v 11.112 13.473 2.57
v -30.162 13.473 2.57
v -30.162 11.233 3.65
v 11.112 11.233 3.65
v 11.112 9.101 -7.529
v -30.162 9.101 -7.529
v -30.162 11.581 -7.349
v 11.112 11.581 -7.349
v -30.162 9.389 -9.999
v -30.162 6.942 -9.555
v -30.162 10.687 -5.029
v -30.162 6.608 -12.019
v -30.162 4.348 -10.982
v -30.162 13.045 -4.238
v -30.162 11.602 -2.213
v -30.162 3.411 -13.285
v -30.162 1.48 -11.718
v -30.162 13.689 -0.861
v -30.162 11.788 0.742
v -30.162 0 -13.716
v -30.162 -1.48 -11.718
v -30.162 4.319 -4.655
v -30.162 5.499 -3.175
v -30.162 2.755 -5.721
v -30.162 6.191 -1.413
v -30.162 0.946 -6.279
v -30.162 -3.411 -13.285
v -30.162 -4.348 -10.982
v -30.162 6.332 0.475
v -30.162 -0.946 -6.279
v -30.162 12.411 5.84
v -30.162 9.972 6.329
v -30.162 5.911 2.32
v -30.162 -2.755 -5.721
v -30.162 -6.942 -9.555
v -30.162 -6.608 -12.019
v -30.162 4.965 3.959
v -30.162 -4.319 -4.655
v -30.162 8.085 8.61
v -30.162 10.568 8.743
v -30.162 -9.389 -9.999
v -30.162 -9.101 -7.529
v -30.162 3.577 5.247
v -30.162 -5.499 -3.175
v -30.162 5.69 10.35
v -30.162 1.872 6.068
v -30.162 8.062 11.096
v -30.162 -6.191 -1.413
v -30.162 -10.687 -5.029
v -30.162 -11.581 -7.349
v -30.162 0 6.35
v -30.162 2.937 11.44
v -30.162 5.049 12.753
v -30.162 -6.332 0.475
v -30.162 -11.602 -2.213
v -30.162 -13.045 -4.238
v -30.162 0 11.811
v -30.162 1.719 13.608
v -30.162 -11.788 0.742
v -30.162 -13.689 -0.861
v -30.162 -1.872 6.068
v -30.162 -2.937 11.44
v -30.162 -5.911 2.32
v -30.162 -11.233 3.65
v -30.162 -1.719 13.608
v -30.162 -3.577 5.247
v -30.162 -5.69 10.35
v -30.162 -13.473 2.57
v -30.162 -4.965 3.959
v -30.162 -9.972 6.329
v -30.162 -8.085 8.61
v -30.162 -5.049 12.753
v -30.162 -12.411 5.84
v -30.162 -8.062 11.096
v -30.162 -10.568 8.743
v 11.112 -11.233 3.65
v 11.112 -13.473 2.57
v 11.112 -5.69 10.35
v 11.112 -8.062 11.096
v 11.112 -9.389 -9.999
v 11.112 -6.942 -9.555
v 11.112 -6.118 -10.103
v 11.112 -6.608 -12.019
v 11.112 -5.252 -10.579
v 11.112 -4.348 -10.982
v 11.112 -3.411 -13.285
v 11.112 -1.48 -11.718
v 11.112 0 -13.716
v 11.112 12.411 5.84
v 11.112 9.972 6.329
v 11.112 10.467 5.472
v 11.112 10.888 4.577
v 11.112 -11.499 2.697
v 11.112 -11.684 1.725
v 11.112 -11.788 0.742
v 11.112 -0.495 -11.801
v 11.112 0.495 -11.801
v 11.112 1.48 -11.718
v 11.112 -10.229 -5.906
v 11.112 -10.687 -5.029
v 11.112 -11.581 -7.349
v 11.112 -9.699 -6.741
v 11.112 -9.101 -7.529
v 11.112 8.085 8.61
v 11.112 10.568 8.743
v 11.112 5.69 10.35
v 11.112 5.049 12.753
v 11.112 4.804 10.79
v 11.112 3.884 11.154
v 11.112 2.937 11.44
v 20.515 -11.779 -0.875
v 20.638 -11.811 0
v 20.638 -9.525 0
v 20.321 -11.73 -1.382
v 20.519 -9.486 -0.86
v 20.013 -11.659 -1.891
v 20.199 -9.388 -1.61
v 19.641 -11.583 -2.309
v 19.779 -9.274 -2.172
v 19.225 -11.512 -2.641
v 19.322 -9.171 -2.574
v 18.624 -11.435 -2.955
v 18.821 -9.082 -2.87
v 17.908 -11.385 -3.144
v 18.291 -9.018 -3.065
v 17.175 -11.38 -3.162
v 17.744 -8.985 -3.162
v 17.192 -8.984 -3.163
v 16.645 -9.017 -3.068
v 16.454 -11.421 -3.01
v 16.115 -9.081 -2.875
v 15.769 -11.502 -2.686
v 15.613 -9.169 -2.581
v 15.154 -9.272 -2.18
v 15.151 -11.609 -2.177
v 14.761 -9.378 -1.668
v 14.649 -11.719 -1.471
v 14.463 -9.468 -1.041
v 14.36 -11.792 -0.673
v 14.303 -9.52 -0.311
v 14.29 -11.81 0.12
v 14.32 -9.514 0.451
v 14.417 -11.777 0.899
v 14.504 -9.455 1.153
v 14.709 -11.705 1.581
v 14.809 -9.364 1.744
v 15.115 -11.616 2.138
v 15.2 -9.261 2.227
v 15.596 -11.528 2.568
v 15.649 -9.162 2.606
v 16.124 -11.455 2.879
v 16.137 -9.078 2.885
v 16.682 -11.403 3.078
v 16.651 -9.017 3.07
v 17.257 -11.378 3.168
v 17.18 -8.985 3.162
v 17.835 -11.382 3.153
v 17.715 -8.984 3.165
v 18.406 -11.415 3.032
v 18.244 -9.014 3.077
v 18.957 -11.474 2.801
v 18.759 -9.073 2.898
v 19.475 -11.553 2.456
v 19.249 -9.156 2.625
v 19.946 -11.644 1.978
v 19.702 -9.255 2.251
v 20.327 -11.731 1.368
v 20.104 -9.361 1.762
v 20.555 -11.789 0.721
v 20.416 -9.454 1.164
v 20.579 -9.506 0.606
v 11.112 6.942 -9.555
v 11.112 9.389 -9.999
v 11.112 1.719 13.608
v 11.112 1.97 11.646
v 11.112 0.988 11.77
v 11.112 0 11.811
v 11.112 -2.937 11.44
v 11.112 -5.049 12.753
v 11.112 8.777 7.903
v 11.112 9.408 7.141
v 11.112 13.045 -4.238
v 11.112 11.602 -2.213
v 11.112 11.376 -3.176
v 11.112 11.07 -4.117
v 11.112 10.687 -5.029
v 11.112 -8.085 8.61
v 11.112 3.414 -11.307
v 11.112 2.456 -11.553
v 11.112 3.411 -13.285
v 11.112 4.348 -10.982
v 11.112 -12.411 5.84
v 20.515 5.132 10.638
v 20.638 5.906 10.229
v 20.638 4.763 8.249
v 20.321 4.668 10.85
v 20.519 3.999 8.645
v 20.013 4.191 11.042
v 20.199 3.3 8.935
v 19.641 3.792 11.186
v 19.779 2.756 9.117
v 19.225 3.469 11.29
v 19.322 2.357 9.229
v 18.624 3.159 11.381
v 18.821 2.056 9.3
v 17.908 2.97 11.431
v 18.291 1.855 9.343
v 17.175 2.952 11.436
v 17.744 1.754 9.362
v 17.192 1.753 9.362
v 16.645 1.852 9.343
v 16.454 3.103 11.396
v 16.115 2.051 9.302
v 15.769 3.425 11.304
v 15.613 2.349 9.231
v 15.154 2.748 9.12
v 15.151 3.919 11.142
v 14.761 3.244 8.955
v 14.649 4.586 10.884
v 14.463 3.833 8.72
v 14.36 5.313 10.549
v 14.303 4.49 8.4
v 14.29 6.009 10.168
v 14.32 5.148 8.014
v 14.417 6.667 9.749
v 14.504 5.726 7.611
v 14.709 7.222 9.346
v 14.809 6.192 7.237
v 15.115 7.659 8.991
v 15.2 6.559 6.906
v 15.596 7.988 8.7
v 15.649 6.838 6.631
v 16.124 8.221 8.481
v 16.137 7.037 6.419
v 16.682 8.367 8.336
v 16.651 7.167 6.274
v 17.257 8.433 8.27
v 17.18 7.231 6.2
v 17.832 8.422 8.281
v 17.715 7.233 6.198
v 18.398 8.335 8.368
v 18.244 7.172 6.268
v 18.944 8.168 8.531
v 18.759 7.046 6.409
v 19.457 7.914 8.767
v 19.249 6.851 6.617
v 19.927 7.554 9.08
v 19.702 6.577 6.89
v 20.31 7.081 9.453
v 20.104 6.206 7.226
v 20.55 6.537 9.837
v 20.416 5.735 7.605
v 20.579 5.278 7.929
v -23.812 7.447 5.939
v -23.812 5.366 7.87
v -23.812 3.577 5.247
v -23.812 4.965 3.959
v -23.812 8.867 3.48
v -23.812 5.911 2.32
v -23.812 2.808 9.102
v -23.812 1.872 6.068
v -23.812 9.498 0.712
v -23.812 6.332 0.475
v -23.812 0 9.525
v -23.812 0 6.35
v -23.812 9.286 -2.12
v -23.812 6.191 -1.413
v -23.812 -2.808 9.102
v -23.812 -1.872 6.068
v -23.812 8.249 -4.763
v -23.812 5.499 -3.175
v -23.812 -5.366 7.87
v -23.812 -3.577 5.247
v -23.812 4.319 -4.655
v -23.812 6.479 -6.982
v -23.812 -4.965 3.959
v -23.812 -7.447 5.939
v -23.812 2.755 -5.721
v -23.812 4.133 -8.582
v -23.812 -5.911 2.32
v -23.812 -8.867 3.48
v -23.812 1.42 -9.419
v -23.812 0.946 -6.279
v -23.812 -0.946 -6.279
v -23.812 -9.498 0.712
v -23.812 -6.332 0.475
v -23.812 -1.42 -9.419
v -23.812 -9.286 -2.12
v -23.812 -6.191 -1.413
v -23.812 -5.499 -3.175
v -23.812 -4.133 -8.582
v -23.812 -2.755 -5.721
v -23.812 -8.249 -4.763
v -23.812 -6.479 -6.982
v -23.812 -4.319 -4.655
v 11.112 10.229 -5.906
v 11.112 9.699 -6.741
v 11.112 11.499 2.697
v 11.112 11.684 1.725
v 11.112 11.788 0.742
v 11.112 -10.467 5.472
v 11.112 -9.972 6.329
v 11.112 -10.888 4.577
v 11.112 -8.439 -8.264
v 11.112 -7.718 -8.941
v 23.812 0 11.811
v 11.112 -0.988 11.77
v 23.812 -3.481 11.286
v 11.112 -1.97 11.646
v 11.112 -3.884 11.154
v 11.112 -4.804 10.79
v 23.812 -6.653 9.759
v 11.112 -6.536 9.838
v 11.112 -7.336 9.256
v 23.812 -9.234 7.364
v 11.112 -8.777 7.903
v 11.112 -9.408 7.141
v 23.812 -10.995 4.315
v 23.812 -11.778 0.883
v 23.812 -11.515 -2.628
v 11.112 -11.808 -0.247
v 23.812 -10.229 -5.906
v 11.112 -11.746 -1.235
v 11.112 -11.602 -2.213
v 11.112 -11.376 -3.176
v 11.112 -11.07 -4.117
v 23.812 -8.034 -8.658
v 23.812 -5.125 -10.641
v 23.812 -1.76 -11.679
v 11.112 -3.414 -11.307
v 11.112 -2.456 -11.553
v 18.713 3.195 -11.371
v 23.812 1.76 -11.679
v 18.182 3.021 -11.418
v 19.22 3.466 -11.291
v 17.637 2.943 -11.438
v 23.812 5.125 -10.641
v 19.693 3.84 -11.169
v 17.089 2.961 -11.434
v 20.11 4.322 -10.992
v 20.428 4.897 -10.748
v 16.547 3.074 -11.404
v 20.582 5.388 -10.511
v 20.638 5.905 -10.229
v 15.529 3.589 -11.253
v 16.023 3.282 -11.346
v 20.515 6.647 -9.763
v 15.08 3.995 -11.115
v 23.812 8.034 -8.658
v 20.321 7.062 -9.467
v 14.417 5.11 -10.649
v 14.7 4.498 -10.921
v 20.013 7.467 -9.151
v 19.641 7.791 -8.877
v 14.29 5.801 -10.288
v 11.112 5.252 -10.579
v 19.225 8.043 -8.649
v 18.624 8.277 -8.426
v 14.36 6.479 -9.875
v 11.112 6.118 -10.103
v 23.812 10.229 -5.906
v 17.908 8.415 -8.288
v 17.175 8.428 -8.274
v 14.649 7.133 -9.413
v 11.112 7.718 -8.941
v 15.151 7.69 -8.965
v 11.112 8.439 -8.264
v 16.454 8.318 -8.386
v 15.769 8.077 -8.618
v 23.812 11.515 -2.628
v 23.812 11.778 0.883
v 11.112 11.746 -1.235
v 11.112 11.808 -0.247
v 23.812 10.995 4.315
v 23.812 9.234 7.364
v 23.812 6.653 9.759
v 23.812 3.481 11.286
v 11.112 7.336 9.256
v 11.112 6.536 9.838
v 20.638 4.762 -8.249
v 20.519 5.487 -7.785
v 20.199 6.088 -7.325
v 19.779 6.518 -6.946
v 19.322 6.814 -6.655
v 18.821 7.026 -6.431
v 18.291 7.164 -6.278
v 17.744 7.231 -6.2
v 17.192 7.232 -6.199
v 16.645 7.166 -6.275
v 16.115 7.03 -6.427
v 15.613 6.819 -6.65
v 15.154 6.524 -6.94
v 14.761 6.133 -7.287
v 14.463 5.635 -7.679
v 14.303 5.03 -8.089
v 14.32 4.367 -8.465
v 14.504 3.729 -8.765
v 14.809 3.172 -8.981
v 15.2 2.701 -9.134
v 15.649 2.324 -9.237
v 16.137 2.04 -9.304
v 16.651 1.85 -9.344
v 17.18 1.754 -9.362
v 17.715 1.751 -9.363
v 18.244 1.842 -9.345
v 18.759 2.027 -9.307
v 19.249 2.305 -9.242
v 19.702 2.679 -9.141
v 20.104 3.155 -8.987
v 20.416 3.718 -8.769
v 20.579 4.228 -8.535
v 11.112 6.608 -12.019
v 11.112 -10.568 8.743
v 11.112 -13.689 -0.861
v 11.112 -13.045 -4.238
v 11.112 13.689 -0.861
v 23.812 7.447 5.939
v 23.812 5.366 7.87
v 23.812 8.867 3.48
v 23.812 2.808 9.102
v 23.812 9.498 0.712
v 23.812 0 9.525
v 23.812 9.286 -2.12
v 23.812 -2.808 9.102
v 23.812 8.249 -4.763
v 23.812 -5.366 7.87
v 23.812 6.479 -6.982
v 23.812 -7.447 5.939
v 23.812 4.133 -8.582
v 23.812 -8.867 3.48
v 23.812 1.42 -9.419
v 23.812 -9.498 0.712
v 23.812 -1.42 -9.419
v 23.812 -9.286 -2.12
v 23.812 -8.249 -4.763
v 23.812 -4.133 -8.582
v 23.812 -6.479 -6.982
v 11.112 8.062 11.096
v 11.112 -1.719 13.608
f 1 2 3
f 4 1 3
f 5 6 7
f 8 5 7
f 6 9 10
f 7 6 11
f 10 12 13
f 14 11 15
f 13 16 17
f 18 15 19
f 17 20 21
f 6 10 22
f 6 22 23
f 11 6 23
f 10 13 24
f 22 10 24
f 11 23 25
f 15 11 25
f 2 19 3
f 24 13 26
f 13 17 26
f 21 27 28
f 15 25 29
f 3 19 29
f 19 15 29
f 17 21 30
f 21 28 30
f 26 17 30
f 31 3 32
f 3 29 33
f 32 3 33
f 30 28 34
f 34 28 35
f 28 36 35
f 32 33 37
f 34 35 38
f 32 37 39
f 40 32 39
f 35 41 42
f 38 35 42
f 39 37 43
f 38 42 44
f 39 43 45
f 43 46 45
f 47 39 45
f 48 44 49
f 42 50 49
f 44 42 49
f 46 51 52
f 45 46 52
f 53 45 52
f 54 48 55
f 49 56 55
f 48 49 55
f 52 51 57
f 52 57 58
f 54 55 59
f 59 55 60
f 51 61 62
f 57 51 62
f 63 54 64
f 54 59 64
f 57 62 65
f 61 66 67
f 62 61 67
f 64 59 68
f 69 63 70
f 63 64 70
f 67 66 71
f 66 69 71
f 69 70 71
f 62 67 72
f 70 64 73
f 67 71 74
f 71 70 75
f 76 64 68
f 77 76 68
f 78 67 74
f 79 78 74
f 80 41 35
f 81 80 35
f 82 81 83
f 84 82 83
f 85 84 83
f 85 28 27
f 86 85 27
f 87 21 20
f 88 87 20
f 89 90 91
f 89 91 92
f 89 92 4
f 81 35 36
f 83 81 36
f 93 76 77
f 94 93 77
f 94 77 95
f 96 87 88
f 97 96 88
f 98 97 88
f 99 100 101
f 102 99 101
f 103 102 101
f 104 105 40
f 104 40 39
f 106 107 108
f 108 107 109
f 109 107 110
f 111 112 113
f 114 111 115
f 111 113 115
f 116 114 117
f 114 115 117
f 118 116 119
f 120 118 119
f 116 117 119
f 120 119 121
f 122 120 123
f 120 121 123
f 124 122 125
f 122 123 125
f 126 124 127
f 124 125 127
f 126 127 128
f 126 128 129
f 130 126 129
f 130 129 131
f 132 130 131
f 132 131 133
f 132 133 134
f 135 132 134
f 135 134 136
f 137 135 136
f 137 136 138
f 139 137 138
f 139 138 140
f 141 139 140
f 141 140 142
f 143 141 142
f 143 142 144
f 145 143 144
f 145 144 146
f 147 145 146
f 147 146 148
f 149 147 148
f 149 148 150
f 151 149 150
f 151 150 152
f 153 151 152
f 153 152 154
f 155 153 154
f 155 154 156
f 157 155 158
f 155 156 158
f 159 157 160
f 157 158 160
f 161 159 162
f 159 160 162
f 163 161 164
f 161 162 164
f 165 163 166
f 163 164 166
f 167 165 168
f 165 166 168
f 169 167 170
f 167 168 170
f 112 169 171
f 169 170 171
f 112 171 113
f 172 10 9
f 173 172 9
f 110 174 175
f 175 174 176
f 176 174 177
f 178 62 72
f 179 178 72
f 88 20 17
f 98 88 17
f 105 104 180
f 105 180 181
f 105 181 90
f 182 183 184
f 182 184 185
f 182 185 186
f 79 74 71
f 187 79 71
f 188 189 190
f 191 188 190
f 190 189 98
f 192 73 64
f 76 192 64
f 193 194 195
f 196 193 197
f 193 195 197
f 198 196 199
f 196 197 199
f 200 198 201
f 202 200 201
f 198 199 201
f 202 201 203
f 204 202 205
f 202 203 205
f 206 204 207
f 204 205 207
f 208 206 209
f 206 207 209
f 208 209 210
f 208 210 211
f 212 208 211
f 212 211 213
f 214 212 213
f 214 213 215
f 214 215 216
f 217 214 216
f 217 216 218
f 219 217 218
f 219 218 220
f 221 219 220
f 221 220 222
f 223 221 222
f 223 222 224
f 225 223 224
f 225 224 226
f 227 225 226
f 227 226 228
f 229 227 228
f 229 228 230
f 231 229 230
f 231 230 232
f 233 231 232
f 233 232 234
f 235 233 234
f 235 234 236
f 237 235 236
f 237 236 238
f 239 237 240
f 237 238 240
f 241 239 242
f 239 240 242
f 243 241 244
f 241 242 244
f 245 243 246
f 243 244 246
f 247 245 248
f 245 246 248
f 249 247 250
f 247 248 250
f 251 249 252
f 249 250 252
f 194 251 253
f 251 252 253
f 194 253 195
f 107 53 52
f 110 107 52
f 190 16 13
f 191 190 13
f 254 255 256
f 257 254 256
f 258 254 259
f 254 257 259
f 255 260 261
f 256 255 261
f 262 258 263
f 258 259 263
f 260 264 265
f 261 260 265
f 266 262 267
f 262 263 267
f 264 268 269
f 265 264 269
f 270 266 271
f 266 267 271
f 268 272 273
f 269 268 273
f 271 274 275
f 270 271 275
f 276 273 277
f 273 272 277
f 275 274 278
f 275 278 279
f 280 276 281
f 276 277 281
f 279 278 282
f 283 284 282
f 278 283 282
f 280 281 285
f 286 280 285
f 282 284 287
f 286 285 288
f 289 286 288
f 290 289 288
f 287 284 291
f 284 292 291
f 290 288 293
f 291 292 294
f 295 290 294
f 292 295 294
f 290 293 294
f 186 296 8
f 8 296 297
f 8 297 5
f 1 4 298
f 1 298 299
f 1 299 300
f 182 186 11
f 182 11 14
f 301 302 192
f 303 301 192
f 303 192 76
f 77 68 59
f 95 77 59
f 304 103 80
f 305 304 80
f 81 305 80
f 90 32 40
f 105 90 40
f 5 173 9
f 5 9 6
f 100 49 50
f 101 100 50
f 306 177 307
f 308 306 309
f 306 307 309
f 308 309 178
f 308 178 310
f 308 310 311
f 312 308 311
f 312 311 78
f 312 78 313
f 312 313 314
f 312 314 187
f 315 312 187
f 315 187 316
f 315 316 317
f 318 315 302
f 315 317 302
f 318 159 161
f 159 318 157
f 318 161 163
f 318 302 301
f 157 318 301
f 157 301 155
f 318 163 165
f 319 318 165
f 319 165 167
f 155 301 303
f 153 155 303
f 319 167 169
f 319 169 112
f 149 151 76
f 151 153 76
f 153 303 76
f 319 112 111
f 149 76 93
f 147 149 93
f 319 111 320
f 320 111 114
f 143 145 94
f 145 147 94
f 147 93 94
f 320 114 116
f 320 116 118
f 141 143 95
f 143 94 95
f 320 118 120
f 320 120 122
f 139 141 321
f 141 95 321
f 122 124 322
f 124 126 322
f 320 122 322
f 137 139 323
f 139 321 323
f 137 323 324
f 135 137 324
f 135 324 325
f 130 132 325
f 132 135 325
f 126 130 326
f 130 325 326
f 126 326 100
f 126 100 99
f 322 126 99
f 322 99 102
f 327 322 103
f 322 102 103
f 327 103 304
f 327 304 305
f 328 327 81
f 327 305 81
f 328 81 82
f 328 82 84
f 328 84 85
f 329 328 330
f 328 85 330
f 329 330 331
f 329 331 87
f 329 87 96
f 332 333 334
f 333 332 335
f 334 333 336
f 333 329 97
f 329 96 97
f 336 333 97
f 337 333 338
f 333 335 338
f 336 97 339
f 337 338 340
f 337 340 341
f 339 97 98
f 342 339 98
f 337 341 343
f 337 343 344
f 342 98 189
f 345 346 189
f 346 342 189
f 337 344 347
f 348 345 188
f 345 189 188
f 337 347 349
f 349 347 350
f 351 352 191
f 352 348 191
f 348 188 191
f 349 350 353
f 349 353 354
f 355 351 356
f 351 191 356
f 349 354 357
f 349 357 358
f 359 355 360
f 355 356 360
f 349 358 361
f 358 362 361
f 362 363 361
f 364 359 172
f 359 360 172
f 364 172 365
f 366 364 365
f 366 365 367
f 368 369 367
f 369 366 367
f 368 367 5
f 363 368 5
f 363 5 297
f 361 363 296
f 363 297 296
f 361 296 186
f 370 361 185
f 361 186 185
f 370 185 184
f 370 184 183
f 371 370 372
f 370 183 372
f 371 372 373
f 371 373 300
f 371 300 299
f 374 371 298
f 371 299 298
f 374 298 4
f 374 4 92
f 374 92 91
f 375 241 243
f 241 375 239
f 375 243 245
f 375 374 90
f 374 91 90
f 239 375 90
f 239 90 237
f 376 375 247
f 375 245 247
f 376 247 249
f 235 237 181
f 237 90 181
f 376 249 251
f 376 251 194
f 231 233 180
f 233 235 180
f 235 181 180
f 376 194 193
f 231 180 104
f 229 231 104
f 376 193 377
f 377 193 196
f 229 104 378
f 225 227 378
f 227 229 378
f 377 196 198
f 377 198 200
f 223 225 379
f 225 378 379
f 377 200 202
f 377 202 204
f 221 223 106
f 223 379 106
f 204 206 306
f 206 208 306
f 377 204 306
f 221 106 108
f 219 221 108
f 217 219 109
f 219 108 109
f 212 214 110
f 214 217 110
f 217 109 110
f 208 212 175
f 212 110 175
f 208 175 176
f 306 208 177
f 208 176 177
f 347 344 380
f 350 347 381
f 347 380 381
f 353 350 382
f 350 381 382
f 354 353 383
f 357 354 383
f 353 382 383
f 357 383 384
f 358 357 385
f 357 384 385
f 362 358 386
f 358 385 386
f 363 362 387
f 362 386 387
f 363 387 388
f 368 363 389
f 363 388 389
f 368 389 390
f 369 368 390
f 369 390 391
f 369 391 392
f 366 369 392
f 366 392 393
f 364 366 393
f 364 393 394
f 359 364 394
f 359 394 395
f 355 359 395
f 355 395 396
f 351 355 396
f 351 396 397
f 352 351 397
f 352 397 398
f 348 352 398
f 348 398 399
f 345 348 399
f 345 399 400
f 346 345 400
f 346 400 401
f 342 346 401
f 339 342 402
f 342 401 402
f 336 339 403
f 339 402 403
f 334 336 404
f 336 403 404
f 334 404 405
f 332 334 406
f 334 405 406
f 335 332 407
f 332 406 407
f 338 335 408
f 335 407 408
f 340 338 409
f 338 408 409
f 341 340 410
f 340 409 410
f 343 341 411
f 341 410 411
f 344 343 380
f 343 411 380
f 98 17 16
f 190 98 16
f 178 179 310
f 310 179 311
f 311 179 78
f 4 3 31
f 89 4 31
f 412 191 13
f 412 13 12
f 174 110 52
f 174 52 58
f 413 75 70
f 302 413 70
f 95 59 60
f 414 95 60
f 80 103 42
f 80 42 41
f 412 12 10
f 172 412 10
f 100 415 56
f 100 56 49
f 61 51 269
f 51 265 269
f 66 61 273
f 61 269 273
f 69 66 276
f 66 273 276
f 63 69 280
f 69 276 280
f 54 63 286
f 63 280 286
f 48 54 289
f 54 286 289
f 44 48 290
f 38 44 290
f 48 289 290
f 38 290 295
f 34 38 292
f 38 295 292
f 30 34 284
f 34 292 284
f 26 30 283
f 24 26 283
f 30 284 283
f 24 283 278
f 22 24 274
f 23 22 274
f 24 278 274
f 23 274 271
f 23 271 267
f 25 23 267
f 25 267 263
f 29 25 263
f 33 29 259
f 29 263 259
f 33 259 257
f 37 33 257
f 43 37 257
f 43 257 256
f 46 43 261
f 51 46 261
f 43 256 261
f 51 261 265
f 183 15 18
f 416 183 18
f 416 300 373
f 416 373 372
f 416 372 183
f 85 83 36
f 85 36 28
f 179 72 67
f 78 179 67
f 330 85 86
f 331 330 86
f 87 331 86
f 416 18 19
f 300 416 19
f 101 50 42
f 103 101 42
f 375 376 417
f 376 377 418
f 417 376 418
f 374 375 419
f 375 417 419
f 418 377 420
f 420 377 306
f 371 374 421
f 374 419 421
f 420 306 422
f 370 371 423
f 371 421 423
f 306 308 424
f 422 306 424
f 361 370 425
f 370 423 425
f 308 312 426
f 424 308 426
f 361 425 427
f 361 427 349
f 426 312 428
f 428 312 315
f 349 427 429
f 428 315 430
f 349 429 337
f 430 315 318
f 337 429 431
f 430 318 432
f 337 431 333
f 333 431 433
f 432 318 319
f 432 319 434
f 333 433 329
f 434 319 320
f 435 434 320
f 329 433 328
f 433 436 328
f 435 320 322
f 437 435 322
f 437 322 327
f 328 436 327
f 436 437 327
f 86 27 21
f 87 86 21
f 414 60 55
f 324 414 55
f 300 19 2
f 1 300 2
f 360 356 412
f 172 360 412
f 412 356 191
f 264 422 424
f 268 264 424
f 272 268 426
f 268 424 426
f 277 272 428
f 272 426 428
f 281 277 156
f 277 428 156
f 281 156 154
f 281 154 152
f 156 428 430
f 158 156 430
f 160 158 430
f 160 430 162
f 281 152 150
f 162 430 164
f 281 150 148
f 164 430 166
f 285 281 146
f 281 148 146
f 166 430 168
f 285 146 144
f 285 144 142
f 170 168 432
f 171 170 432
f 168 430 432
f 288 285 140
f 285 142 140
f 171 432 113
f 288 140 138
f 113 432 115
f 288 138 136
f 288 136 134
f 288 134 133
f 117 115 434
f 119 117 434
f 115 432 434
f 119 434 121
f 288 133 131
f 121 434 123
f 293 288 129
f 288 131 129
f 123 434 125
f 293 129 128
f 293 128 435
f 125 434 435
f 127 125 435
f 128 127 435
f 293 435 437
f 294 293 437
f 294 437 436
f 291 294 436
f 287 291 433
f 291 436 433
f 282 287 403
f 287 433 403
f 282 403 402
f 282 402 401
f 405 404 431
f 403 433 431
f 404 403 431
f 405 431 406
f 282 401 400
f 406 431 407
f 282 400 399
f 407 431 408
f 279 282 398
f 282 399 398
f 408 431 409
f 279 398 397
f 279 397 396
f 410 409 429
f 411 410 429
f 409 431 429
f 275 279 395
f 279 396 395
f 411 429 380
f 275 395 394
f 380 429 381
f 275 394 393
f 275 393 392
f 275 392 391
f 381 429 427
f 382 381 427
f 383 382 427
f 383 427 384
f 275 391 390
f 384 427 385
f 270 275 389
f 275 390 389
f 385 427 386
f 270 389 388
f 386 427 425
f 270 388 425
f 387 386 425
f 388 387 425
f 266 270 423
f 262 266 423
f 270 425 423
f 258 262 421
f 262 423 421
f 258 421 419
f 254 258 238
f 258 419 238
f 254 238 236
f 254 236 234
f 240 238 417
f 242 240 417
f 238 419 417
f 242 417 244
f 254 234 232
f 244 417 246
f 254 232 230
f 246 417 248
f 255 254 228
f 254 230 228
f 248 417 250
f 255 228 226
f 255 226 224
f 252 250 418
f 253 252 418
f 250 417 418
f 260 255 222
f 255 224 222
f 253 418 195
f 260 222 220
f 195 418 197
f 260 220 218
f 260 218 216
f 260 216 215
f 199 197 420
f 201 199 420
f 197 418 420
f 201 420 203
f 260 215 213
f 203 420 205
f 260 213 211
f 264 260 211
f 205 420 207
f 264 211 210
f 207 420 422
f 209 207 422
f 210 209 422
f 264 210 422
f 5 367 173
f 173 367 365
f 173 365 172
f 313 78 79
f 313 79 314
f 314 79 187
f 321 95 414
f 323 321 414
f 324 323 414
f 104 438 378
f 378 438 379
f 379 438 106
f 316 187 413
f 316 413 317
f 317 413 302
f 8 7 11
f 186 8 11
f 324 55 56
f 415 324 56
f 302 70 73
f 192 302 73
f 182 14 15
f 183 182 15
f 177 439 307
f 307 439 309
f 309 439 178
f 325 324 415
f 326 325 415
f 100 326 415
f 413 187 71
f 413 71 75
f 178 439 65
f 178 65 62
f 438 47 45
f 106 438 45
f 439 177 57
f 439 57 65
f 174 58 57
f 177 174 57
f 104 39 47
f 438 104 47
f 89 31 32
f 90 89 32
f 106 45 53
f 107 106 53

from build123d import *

# Parameters (mm, degrees)
SKETCH2_R          = 3.175
CUT_EXTRUDE1_DEPTH = 16.875
CIRPATTERN1_COUNT  = 3
SKETCH3_R          = 15.875
CUT_EXTRUDE2_DEPTH = 54.9750001


with BuildPart() as part:
    # Sketch1 → Revolve1 (revolve)
    with BuildSketch(Plane(origin=(0, 0, 0), x_dir=(1, 0, 0), z_dir=(0, 1, 0))):
        Polygon((-30.1625, -15.875), (-30.1625, -6.35), (-23.8125, -6.35), (-23.8125, -9.525), (23.8125, -9.525), (23.8125, -11.811), (11.1125, -11.811), (11.1125, -15.875), align=None)
    revolve(axis=Axis((-42.066572288, 0, 0), (1, 0, 0)))

    # Sketch2 → Cut-Extrude1 (cut, through all)
    with BuildSketch(Plane(origin=(0, 0, 0), x_dir=(1, 0, 0), z_dir=(0, 1, 0))):
        with Locations((17.4625, 0)):
            Circle(SKETCH2_R)
    cut_extrude1 = extrude(amount=-CUT_EXTRUDE1_DEPTH, mode=Mode.SUBTRACT)

    # CirPattern1: Cut-Extrude1 ×3 about axis
    cirpattern1_axis = Axis((-42.066572288, 0, 0), (1, 0, 0))
    for i in range(1, CIRPATTERN1_COUNT):
        add(cut_extrude1.rotate(cirpattern1_axis, i * 360 / CIRPATTERN1_COUNT), mode=Mode.SUBTRACT)

    # Sketch3 → Cut-Extrude2 (cut, through all)
    with BuildSketch(Plane.ZY.offset(30.1625)):
        Circle(SKETCH3_R)
        Polygon((13.607845243, 1.719070632), (11.811, 0), (13.607845243, -1.719070632), (11.439935716, -2.937276257), (12.75281428, -5.049196365), (10.350058198, -5.689992645), (11.096477095, -8.06206252), (8.609848458, -8.085185868), (8.742907443, -10.568359638), (6.328650275, -9.972357128), (5.839988763, -12.410607852), (3.649799721, -11.232928514), (2.570122111, -13.473051931), (0.741618826, -11.787693689), (-0.861234766, -13.688934607), (-2.213160707, -11.601794718), (-4.238477095, -13.044691178), (-5.028879213, -10.686912317), (-7.34940032, -11.580801826), (-7.528614743, -9.10053191), (-9.998533694, -9.389248105), (-9.555299721, -6.942331615), (-12.019422423, -6.607733394), (-10.981590075, -4.347919092), (-13.285086638, -3.411030492), (-11.717866737, -1.480310822), (-13.716, 0), (-11.717866737, 1.480310822), (-13.285086638, 3.411030492), (-10.981590075, 4.347919092), (-12.019422423, 6.607733394), (-9.555299721, 6.942331615), (-9.998533694, 9.389248105), (-7.528614743, 9.10053191), (-7.34940032, 11.580801826), (-5.028879213, 10.686912317), (-4.238477095, 13.044691178), (-2.213160707, 11.601794718), (-0.861234766, 13.688934607), (0.741618826, 11.787693689), (2.570122111, 13.473051931), (3.649799721, 11.232928514), (5.839988763, 12.410607852), (6.328650275, 9.972357128), (8.742907443, 10.568359638), (8.609848458, 8.085185868), (11.096477095, 8.06206252), (10.350058198, 5.689992645), (12.75281428, 5.049196365), (11.439935716, 2.937276257), align=None, mode=Mode.SUBTRACT)
    extrude(amount=-CUT_EXTRUDE2_DEPTH, mode=Mode.SUBTRACT)


solid = part.part
